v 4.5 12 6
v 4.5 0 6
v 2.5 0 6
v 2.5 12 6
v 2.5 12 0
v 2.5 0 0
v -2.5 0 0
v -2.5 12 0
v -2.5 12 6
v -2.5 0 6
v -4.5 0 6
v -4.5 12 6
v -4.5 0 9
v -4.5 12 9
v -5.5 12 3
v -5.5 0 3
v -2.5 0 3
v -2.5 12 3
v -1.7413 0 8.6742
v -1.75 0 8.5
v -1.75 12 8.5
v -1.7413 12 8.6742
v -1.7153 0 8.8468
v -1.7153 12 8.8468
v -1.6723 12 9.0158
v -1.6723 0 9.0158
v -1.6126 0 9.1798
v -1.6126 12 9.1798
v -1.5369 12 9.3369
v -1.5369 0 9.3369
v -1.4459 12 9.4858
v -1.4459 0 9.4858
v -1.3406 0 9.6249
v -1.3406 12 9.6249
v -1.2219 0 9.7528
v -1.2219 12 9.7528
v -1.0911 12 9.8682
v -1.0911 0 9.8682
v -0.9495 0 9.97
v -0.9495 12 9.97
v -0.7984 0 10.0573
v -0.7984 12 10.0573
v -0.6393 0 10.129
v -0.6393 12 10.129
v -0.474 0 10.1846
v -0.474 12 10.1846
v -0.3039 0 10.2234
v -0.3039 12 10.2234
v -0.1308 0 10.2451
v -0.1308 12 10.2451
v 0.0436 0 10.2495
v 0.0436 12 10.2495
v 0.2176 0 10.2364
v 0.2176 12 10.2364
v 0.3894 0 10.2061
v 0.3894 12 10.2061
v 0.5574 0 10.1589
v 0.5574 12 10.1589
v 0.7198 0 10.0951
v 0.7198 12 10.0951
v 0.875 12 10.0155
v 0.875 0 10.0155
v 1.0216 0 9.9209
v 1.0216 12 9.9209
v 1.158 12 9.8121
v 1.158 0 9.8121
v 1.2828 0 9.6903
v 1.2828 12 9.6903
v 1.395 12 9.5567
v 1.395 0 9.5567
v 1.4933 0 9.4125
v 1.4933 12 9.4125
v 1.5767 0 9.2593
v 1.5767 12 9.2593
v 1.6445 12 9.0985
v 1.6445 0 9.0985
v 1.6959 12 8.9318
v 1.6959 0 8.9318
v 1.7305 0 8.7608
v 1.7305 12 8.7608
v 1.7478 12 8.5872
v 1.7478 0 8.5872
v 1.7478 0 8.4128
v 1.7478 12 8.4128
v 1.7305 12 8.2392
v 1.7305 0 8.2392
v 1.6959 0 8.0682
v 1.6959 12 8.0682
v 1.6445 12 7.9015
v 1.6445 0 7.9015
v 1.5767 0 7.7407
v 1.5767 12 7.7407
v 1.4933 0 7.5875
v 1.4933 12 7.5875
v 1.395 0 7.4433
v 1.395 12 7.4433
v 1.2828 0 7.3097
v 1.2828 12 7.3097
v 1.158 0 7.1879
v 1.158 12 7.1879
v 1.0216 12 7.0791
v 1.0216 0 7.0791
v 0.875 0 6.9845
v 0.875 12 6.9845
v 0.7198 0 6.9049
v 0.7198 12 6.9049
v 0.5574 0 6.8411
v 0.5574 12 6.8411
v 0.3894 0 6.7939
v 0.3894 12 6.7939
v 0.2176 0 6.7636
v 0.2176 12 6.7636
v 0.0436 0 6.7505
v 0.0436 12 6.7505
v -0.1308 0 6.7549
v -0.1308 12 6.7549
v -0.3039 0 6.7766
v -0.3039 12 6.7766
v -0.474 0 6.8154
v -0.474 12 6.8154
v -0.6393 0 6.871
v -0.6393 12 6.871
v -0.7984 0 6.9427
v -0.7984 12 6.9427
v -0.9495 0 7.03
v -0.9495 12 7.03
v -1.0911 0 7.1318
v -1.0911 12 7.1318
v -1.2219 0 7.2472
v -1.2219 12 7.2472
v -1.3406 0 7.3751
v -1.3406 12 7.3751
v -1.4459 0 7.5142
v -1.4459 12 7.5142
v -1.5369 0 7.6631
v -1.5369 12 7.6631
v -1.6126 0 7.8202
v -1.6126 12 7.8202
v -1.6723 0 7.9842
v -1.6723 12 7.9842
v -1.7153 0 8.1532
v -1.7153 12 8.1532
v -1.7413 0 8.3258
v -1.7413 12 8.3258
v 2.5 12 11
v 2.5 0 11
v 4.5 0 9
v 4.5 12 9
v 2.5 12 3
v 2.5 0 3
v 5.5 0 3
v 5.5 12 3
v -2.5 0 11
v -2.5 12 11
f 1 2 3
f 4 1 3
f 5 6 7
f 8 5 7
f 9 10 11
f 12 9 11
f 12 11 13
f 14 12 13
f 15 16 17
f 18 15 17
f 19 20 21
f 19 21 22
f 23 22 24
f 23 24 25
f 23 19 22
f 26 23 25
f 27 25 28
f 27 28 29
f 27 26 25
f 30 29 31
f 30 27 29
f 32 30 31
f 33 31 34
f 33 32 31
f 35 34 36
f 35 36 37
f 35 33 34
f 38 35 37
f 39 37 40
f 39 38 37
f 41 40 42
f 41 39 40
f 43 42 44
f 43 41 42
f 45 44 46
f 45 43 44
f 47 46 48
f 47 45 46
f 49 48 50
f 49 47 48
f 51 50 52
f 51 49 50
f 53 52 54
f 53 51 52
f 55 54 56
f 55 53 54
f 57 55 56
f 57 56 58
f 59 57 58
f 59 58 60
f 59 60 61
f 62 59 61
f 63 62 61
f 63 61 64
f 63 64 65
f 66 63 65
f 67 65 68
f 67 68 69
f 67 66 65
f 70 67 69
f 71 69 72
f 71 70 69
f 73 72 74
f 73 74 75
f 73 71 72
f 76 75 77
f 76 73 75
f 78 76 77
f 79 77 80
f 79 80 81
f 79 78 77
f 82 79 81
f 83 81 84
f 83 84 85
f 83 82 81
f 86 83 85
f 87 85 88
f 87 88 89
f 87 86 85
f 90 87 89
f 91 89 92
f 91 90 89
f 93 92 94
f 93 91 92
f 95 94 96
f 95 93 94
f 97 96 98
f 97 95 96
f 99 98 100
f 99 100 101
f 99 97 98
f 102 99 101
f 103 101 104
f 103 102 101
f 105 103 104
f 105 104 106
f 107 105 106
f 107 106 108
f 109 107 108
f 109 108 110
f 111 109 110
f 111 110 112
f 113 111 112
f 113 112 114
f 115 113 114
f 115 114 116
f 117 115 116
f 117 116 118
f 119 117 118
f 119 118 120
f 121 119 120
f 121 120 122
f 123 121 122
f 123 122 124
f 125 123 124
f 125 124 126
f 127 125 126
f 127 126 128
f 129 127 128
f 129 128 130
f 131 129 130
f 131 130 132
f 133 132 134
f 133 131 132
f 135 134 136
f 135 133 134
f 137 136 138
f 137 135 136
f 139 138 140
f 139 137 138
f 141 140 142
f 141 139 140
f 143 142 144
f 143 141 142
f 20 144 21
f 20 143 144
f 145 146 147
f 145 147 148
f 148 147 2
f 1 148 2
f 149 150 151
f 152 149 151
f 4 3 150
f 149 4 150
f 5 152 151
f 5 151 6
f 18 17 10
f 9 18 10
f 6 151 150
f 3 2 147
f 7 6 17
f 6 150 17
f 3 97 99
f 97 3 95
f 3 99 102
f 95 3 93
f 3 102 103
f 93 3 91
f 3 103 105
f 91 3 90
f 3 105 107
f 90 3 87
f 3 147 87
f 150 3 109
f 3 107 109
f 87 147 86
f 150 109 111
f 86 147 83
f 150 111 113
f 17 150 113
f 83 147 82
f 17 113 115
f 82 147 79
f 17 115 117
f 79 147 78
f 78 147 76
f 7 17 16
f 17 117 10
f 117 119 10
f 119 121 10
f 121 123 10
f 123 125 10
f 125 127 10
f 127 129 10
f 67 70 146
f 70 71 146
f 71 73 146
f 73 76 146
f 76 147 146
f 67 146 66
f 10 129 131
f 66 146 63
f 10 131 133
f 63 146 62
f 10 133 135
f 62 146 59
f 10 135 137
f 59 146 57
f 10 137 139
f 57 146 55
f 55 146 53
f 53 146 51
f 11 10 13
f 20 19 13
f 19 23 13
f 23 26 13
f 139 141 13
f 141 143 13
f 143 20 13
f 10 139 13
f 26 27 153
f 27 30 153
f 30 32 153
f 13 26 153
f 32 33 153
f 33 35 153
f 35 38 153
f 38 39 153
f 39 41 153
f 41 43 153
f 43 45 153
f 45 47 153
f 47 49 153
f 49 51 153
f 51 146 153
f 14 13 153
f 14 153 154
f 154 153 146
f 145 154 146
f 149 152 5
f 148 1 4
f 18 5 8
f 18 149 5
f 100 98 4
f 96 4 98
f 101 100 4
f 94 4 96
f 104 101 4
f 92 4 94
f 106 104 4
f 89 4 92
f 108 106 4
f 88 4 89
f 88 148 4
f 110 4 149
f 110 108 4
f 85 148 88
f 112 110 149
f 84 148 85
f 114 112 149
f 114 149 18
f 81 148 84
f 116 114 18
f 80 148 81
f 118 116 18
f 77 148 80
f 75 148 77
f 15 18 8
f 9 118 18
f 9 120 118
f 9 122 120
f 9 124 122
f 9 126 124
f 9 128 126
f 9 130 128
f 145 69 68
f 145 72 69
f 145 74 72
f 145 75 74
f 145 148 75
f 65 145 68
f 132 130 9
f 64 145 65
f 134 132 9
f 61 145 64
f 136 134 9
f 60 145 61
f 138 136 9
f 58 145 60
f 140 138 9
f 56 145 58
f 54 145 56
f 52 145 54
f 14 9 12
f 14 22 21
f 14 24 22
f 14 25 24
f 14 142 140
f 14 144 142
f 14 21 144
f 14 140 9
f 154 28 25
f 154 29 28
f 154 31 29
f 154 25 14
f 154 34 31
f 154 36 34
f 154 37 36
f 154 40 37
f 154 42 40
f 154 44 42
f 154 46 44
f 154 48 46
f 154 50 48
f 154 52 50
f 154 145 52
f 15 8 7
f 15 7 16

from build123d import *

# Parameters (mm, degrees)
ESQUISSE1_R        = 1.75
BOSS_EXTRU_1_DEPTH = 12
CHANFREIN1_SIZE    = 2


with BuildPart() as part:
    # Esquisse1 → Boss.-Extru.1 (new body)
    with BuildSketch(Plane(origin=(0, 0, 0), x_dir=(-1, 0, 0), z_dir=(0, 1, 0))):
        Polygon((-5.5, 3), (-2.5, 0), (2.5, 0), (5.5, 3), (2.5, 3), (2.5, 6), (4.5, 6), (4.5, 11), (-4.5, 11), (-4.5, 6), (-2.5, 6), (-2.5, 3), align=None)
        with Locations((0, 8.5)):
            Circle(ESQUISSE1_R, mode=Mode.SUBTRACT)
    extrude(amount=BOSS_EXTRU_1_DEPTH)

    # Chanfrein1
    chanfrein1_edges = [part.edges().sort_by_distance(p)[0] for p in [
        (4.5, 6, 11),
        (-4.5, 6, 11),
    ]]
    chamfer(chanfrein1_edges, length=CHANFREIN1_SIZE)


solid = part.part
